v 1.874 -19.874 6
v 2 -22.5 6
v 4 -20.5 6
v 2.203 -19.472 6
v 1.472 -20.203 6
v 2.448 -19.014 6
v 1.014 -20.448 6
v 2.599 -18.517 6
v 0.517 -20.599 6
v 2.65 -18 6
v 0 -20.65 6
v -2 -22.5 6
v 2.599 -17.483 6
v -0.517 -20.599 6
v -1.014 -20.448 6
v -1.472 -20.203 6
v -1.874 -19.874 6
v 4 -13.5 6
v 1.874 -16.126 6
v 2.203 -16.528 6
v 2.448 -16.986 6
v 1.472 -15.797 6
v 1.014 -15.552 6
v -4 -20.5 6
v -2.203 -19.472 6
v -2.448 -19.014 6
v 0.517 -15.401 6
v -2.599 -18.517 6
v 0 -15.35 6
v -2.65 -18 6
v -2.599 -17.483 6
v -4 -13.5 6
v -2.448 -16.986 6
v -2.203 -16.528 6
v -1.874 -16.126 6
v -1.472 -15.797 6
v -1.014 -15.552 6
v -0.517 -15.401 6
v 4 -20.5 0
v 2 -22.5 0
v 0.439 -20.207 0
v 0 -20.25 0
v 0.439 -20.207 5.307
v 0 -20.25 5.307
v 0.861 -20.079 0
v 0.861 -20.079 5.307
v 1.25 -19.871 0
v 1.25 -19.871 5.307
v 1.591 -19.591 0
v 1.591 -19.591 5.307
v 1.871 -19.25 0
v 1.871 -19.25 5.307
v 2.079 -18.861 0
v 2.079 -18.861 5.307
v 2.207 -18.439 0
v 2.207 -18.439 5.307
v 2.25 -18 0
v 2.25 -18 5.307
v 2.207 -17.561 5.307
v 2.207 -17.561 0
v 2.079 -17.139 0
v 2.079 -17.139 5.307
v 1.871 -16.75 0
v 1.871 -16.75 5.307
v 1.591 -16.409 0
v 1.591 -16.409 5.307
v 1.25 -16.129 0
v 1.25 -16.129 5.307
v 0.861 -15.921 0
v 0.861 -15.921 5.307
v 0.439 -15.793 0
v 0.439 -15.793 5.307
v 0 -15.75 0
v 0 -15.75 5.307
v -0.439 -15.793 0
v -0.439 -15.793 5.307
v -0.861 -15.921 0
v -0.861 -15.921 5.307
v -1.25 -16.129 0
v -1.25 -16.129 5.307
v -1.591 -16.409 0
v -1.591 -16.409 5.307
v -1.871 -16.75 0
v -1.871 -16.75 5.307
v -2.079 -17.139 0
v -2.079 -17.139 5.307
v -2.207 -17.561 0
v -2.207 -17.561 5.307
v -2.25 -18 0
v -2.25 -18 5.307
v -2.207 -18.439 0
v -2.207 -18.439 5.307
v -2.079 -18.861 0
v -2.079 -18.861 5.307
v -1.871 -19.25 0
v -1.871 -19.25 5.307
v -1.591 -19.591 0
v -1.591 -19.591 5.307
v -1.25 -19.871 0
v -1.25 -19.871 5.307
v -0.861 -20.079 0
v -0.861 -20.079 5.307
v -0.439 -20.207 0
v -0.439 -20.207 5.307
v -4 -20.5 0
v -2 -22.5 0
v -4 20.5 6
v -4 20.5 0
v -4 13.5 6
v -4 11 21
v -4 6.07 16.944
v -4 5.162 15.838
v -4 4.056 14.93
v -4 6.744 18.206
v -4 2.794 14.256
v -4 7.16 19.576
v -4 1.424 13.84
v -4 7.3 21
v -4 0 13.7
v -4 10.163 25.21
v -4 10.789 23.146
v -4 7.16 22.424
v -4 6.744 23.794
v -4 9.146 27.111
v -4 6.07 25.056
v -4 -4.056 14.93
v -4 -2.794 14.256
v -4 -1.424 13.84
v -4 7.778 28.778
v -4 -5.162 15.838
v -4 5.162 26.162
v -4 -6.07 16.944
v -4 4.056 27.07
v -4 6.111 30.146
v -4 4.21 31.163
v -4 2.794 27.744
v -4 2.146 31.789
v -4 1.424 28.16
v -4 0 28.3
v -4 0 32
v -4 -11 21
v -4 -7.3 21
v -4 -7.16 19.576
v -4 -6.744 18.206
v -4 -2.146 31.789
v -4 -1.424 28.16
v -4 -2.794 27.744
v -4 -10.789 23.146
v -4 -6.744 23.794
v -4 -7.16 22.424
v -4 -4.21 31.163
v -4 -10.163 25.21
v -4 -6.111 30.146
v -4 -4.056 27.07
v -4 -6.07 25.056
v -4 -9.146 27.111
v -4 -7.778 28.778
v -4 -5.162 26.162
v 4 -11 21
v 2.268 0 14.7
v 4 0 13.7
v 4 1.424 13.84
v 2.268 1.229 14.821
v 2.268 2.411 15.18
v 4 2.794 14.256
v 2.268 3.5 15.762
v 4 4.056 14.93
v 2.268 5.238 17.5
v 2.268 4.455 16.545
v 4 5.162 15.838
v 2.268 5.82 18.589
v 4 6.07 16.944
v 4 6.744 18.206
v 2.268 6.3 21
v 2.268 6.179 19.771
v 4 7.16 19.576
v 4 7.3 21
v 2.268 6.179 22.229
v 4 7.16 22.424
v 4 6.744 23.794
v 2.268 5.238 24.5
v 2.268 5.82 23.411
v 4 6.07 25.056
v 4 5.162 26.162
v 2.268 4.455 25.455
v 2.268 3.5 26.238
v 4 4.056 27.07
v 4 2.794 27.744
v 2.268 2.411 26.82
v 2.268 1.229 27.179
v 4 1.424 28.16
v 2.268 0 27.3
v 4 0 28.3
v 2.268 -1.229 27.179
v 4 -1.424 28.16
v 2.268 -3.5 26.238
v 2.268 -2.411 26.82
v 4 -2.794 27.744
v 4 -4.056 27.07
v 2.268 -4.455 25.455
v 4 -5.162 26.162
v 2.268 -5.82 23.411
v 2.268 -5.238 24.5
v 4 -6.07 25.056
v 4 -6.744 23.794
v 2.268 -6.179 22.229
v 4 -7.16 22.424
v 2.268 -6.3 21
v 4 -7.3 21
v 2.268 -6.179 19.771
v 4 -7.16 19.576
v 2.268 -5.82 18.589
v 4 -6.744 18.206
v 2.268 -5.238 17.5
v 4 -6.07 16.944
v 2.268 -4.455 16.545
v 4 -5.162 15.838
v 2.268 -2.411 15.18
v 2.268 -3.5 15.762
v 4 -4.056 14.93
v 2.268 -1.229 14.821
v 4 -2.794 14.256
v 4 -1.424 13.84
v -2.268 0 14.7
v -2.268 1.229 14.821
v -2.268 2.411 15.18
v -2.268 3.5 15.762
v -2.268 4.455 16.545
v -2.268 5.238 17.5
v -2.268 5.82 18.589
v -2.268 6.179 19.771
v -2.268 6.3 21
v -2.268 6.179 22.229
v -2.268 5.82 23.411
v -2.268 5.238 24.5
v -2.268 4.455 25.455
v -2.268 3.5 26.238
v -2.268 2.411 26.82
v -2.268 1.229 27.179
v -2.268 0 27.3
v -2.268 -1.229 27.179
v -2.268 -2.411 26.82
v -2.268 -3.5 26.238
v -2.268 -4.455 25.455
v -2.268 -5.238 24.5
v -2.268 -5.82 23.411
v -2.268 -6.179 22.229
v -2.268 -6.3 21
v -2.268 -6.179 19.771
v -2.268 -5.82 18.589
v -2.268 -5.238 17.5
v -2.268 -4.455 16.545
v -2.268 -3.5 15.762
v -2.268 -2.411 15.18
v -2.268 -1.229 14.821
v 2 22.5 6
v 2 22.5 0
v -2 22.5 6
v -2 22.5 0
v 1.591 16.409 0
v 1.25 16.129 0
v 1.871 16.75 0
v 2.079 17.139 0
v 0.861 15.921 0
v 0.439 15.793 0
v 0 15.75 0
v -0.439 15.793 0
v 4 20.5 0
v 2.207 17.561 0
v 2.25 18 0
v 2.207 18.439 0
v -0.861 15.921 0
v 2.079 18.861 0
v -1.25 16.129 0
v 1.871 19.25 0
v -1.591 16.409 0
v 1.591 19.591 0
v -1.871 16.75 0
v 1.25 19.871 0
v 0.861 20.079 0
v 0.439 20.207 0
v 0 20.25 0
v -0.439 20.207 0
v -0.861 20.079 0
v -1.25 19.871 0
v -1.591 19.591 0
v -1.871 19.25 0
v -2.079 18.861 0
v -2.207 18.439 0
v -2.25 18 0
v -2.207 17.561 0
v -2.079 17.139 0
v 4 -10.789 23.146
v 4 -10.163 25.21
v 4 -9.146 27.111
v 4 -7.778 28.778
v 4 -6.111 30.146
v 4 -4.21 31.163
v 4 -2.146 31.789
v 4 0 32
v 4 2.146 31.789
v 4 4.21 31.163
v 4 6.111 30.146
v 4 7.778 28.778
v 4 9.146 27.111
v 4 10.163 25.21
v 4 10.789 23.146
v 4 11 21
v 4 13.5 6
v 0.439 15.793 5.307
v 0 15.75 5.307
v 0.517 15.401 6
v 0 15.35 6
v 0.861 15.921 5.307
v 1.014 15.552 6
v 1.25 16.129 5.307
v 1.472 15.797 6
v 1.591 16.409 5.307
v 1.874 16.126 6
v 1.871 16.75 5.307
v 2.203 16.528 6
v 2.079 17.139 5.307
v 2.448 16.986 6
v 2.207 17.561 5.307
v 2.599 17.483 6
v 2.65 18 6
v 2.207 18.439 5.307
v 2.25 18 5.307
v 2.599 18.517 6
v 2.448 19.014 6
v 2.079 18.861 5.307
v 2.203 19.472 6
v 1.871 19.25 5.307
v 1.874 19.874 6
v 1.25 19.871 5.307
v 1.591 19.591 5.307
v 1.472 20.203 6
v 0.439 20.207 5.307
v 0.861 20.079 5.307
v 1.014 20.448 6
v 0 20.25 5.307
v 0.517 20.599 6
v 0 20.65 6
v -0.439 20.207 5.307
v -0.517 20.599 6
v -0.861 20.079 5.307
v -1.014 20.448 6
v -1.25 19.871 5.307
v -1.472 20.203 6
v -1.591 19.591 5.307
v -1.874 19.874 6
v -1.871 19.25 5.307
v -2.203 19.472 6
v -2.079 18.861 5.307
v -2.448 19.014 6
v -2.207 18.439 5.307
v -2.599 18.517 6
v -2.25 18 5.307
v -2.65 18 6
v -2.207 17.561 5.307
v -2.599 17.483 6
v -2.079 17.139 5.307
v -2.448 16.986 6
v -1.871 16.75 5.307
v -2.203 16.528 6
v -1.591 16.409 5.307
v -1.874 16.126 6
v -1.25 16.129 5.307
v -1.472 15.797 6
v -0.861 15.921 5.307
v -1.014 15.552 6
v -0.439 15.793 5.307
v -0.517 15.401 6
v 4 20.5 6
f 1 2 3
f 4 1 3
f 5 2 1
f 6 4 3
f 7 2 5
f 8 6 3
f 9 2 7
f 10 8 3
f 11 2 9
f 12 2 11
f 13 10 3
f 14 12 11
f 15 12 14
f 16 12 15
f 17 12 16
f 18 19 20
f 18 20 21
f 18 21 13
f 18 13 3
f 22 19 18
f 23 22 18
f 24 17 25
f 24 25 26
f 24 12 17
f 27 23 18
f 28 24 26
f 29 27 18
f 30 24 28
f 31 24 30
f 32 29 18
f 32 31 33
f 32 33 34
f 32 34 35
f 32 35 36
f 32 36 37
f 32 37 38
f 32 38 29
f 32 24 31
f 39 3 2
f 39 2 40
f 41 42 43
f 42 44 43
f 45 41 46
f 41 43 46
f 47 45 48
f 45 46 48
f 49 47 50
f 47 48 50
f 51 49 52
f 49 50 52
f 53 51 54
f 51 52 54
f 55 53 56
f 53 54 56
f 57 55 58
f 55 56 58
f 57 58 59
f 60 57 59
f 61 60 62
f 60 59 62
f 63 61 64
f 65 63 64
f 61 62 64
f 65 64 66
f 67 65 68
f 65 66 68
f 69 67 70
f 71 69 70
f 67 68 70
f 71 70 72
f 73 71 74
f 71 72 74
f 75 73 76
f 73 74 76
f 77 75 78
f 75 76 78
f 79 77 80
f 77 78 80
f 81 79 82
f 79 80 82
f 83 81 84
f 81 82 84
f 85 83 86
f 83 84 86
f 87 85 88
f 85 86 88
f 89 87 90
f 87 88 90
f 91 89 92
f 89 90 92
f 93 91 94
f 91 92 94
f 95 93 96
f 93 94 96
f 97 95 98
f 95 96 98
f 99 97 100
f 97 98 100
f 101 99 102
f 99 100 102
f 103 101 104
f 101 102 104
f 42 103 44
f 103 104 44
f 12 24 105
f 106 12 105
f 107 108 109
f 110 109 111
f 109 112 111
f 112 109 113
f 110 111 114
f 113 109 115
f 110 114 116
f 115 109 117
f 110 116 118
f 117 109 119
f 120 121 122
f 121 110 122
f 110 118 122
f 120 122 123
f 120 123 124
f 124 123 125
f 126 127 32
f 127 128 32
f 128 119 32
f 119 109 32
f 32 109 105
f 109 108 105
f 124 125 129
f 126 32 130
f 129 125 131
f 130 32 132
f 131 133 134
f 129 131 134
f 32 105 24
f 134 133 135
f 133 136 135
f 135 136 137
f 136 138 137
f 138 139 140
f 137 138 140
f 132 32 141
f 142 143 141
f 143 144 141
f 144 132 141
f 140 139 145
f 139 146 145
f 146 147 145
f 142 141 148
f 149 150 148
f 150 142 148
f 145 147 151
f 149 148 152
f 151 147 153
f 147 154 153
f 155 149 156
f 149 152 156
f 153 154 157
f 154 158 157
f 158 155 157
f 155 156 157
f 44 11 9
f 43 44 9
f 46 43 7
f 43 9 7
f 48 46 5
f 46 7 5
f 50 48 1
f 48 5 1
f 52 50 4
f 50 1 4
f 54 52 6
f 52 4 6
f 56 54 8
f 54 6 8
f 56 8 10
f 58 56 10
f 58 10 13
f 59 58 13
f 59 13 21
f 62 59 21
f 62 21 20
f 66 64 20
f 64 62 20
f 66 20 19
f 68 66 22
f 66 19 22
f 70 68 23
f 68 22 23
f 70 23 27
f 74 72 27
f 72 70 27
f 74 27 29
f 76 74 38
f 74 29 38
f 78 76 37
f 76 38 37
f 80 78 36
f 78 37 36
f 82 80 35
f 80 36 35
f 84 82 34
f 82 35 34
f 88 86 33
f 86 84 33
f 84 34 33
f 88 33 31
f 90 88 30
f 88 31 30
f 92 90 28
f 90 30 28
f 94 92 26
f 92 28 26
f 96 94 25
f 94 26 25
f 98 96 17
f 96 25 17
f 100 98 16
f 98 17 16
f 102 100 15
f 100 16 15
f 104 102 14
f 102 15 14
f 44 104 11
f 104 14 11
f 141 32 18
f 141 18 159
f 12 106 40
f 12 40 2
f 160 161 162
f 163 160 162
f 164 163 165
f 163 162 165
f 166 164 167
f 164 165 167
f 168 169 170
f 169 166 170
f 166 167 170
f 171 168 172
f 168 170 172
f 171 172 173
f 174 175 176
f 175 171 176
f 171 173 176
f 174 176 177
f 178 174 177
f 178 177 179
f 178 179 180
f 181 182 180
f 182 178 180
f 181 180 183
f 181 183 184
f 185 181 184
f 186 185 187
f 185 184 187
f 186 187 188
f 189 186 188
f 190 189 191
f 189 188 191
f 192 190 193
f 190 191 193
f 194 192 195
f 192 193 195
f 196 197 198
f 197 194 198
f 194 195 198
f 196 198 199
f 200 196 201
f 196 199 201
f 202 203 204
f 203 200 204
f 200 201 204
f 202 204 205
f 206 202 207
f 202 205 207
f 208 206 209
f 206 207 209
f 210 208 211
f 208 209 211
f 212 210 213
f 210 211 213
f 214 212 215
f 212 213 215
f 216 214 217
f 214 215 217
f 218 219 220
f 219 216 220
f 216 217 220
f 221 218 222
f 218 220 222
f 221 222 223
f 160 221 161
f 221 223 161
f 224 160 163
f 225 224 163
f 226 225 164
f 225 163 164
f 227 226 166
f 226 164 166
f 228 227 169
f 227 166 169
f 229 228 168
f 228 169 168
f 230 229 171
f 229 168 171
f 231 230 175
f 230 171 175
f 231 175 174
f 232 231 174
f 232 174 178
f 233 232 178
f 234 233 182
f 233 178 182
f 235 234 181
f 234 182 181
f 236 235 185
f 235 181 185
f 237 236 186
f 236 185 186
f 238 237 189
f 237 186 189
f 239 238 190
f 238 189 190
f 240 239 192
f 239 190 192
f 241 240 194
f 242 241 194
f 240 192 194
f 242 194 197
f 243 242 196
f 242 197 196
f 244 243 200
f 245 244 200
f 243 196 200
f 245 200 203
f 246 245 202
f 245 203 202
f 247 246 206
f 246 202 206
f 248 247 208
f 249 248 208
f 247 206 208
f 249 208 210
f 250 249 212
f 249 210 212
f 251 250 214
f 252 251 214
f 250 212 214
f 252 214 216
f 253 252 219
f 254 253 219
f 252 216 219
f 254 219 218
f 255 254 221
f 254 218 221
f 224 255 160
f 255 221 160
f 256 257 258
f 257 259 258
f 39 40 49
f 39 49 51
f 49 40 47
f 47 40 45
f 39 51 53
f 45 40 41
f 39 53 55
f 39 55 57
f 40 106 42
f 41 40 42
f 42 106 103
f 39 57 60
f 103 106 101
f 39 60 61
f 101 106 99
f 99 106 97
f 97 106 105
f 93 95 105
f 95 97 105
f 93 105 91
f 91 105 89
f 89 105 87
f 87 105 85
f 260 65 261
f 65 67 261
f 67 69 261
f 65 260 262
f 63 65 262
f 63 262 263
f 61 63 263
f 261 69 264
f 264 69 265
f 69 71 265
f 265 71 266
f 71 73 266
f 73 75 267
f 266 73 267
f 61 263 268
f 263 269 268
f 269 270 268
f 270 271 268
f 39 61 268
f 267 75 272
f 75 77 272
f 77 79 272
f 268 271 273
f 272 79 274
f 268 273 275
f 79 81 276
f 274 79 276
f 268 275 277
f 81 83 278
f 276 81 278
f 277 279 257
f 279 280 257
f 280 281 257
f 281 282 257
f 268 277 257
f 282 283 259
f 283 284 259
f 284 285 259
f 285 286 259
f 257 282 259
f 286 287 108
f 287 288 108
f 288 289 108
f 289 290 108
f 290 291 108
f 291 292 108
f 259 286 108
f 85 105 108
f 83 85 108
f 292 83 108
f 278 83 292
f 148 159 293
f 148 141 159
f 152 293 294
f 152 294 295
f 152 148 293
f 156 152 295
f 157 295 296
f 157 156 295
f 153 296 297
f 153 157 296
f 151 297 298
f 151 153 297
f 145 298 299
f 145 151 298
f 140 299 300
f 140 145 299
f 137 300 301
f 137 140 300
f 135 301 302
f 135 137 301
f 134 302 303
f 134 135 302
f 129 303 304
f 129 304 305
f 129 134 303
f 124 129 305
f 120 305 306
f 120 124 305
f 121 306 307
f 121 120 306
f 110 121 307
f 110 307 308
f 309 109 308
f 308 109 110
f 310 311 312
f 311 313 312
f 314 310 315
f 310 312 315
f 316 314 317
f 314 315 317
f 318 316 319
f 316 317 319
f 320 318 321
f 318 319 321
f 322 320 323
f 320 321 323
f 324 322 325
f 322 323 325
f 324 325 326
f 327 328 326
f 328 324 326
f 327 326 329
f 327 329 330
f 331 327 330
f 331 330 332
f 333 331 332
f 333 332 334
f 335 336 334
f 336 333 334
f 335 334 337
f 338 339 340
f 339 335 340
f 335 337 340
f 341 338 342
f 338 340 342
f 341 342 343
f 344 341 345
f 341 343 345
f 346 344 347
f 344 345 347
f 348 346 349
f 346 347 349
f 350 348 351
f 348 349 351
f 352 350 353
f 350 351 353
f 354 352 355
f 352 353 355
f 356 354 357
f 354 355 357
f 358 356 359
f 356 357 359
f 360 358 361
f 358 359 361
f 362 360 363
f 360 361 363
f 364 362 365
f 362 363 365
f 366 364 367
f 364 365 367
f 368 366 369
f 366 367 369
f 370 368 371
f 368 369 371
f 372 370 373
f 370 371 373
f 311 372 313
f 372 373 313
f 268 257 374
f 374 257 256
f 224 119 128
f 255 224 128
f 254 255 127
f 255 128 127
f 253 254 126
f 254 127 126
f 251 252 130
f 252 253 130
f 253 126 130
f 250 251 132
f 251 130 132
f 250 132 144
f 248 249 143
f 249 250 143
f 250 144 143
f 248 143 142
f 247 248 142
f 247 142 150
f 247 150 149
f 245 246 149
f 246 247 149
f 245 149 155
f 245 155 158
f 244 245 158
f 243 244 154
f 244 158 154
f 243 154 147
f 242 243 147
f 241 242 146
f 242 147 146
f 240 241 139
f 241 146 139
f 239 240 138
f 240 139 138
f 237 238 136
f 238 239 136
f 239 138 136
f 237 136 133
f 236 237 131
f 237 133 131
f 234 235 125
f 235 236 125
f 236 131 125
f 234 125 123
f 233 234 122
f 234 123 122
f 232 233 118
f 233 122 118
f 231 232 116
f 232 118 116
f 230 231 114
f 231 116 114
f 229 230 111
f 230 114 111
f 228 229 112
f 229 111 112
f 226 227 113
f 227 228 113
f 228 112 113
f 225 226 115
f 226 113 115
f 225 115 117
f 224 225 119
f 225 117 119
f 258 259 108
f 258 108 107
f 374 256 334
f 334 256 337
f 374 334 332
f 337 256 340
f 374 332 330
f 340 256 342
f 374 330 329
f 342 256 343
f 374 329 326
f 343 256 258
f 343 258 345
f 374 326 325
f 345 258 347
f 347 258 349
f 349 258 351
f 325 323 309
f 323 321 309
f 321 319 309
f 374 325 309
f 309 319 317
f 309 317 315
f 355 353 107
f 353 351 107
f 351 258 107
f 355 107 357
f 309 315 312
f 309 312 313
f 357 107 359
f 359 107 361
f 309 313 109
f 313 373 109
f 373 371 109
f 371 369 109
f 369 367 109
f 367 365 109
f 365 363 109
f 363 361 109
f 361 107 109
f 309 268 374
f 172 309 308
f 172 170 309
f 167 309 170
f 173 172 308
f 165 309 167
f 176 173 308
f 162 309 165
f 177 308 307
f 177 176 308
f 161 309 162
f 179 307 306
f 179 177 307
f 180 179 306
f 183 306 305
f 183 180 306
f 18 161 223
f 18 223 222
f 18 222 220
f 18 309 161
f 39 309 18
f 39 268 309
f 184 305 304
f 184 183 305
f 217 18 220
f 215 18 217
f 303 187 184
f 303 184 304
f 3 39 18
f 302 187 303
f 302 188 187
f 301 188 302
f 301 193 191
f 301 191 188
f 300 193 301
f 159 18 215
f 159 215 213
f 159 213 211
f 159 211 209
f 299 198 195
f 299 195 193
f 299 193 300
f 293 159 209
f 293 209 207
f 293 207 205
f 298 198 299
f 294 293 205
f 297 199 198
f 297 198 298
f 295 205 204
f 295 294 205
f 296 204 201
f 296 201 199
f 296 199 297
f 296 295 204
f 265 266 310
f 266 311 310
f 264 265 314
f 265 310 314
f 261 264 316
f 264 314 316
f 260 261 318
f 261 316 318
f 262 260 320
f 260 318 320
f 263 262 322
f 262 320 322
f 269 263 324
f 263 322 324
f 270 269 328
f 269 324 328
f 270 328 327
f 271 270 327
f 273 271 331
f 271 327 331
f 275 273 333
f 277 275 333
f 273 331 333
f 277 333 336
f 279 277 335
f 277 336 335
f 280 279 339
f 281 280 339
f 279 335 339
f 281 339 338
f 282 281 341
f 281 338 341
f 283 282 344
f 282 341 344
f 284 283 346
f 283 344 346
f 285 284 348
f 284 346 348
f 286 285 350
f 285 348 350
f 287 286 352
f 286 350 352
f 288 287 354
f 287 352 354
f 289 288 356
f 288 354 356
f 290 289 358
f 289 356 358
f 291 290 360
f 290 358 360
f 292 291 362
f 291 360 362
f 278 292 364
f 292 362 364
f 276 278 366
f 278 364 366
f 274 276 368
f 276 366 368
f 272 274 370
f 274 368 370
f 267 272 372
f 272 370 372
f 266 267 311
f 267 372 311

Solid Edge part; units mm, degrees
sketch "Sketch1" plane through (0, 0, 0) normal (1, 0, 0) x (0, 1, 0)
  line L0 (-22.5, 0) -> (22.5, 0)
  line L1 (22.5, 0) -> (22.5, 6)
  line L2 (22.5, 6) -> (13.5, 6)
  line L3 (13.5, 6) -> (11, 21)
  arc A0 (-11, 21) -> (11, 21) centre (0, 21) cw
  line L4 (-13.5, 6) -> (-11, 21)
  line L5 (-22.5, 6) -> (-13.5, 6)
  line L6 (-22.5, 0) -> (-22.5, 6)
  dimension "D1" = 45
  dimension "D2" = 9
  dimension "D3" = 6
  dimension "D4" = 11
  dimension "D5" = 15
extrude "Protrusion1" add sketch "Sketch1" along normal mid plane 8
hole "Hole_1" at (0, -18, 6) direction (0, 0, -1) diameter 4.5 end up to next start chamfer 0.4 start chamfer angle 30
hole "Hole1" at (0, 18, 6) direction (0, 0, -1) diameter 4.5 end up to next start chamfer 0.4 start chamfer angle 30
chamfer "Chamfer_1" distance 2 angle 45 4 edges at (4, -22.5, 3) (-4, -22.5, 3) (-4, 22.5, 3) (4, 22.5, 3)
hole "Hole_3" at (4, 0, 21) direction (-1, 0, 0) diameter 12.6 end up to next start chamfer 1 start chamfer angle 30 end chamfer 1 end chamfer angle 30
properties material "Polyethylene, low density"
